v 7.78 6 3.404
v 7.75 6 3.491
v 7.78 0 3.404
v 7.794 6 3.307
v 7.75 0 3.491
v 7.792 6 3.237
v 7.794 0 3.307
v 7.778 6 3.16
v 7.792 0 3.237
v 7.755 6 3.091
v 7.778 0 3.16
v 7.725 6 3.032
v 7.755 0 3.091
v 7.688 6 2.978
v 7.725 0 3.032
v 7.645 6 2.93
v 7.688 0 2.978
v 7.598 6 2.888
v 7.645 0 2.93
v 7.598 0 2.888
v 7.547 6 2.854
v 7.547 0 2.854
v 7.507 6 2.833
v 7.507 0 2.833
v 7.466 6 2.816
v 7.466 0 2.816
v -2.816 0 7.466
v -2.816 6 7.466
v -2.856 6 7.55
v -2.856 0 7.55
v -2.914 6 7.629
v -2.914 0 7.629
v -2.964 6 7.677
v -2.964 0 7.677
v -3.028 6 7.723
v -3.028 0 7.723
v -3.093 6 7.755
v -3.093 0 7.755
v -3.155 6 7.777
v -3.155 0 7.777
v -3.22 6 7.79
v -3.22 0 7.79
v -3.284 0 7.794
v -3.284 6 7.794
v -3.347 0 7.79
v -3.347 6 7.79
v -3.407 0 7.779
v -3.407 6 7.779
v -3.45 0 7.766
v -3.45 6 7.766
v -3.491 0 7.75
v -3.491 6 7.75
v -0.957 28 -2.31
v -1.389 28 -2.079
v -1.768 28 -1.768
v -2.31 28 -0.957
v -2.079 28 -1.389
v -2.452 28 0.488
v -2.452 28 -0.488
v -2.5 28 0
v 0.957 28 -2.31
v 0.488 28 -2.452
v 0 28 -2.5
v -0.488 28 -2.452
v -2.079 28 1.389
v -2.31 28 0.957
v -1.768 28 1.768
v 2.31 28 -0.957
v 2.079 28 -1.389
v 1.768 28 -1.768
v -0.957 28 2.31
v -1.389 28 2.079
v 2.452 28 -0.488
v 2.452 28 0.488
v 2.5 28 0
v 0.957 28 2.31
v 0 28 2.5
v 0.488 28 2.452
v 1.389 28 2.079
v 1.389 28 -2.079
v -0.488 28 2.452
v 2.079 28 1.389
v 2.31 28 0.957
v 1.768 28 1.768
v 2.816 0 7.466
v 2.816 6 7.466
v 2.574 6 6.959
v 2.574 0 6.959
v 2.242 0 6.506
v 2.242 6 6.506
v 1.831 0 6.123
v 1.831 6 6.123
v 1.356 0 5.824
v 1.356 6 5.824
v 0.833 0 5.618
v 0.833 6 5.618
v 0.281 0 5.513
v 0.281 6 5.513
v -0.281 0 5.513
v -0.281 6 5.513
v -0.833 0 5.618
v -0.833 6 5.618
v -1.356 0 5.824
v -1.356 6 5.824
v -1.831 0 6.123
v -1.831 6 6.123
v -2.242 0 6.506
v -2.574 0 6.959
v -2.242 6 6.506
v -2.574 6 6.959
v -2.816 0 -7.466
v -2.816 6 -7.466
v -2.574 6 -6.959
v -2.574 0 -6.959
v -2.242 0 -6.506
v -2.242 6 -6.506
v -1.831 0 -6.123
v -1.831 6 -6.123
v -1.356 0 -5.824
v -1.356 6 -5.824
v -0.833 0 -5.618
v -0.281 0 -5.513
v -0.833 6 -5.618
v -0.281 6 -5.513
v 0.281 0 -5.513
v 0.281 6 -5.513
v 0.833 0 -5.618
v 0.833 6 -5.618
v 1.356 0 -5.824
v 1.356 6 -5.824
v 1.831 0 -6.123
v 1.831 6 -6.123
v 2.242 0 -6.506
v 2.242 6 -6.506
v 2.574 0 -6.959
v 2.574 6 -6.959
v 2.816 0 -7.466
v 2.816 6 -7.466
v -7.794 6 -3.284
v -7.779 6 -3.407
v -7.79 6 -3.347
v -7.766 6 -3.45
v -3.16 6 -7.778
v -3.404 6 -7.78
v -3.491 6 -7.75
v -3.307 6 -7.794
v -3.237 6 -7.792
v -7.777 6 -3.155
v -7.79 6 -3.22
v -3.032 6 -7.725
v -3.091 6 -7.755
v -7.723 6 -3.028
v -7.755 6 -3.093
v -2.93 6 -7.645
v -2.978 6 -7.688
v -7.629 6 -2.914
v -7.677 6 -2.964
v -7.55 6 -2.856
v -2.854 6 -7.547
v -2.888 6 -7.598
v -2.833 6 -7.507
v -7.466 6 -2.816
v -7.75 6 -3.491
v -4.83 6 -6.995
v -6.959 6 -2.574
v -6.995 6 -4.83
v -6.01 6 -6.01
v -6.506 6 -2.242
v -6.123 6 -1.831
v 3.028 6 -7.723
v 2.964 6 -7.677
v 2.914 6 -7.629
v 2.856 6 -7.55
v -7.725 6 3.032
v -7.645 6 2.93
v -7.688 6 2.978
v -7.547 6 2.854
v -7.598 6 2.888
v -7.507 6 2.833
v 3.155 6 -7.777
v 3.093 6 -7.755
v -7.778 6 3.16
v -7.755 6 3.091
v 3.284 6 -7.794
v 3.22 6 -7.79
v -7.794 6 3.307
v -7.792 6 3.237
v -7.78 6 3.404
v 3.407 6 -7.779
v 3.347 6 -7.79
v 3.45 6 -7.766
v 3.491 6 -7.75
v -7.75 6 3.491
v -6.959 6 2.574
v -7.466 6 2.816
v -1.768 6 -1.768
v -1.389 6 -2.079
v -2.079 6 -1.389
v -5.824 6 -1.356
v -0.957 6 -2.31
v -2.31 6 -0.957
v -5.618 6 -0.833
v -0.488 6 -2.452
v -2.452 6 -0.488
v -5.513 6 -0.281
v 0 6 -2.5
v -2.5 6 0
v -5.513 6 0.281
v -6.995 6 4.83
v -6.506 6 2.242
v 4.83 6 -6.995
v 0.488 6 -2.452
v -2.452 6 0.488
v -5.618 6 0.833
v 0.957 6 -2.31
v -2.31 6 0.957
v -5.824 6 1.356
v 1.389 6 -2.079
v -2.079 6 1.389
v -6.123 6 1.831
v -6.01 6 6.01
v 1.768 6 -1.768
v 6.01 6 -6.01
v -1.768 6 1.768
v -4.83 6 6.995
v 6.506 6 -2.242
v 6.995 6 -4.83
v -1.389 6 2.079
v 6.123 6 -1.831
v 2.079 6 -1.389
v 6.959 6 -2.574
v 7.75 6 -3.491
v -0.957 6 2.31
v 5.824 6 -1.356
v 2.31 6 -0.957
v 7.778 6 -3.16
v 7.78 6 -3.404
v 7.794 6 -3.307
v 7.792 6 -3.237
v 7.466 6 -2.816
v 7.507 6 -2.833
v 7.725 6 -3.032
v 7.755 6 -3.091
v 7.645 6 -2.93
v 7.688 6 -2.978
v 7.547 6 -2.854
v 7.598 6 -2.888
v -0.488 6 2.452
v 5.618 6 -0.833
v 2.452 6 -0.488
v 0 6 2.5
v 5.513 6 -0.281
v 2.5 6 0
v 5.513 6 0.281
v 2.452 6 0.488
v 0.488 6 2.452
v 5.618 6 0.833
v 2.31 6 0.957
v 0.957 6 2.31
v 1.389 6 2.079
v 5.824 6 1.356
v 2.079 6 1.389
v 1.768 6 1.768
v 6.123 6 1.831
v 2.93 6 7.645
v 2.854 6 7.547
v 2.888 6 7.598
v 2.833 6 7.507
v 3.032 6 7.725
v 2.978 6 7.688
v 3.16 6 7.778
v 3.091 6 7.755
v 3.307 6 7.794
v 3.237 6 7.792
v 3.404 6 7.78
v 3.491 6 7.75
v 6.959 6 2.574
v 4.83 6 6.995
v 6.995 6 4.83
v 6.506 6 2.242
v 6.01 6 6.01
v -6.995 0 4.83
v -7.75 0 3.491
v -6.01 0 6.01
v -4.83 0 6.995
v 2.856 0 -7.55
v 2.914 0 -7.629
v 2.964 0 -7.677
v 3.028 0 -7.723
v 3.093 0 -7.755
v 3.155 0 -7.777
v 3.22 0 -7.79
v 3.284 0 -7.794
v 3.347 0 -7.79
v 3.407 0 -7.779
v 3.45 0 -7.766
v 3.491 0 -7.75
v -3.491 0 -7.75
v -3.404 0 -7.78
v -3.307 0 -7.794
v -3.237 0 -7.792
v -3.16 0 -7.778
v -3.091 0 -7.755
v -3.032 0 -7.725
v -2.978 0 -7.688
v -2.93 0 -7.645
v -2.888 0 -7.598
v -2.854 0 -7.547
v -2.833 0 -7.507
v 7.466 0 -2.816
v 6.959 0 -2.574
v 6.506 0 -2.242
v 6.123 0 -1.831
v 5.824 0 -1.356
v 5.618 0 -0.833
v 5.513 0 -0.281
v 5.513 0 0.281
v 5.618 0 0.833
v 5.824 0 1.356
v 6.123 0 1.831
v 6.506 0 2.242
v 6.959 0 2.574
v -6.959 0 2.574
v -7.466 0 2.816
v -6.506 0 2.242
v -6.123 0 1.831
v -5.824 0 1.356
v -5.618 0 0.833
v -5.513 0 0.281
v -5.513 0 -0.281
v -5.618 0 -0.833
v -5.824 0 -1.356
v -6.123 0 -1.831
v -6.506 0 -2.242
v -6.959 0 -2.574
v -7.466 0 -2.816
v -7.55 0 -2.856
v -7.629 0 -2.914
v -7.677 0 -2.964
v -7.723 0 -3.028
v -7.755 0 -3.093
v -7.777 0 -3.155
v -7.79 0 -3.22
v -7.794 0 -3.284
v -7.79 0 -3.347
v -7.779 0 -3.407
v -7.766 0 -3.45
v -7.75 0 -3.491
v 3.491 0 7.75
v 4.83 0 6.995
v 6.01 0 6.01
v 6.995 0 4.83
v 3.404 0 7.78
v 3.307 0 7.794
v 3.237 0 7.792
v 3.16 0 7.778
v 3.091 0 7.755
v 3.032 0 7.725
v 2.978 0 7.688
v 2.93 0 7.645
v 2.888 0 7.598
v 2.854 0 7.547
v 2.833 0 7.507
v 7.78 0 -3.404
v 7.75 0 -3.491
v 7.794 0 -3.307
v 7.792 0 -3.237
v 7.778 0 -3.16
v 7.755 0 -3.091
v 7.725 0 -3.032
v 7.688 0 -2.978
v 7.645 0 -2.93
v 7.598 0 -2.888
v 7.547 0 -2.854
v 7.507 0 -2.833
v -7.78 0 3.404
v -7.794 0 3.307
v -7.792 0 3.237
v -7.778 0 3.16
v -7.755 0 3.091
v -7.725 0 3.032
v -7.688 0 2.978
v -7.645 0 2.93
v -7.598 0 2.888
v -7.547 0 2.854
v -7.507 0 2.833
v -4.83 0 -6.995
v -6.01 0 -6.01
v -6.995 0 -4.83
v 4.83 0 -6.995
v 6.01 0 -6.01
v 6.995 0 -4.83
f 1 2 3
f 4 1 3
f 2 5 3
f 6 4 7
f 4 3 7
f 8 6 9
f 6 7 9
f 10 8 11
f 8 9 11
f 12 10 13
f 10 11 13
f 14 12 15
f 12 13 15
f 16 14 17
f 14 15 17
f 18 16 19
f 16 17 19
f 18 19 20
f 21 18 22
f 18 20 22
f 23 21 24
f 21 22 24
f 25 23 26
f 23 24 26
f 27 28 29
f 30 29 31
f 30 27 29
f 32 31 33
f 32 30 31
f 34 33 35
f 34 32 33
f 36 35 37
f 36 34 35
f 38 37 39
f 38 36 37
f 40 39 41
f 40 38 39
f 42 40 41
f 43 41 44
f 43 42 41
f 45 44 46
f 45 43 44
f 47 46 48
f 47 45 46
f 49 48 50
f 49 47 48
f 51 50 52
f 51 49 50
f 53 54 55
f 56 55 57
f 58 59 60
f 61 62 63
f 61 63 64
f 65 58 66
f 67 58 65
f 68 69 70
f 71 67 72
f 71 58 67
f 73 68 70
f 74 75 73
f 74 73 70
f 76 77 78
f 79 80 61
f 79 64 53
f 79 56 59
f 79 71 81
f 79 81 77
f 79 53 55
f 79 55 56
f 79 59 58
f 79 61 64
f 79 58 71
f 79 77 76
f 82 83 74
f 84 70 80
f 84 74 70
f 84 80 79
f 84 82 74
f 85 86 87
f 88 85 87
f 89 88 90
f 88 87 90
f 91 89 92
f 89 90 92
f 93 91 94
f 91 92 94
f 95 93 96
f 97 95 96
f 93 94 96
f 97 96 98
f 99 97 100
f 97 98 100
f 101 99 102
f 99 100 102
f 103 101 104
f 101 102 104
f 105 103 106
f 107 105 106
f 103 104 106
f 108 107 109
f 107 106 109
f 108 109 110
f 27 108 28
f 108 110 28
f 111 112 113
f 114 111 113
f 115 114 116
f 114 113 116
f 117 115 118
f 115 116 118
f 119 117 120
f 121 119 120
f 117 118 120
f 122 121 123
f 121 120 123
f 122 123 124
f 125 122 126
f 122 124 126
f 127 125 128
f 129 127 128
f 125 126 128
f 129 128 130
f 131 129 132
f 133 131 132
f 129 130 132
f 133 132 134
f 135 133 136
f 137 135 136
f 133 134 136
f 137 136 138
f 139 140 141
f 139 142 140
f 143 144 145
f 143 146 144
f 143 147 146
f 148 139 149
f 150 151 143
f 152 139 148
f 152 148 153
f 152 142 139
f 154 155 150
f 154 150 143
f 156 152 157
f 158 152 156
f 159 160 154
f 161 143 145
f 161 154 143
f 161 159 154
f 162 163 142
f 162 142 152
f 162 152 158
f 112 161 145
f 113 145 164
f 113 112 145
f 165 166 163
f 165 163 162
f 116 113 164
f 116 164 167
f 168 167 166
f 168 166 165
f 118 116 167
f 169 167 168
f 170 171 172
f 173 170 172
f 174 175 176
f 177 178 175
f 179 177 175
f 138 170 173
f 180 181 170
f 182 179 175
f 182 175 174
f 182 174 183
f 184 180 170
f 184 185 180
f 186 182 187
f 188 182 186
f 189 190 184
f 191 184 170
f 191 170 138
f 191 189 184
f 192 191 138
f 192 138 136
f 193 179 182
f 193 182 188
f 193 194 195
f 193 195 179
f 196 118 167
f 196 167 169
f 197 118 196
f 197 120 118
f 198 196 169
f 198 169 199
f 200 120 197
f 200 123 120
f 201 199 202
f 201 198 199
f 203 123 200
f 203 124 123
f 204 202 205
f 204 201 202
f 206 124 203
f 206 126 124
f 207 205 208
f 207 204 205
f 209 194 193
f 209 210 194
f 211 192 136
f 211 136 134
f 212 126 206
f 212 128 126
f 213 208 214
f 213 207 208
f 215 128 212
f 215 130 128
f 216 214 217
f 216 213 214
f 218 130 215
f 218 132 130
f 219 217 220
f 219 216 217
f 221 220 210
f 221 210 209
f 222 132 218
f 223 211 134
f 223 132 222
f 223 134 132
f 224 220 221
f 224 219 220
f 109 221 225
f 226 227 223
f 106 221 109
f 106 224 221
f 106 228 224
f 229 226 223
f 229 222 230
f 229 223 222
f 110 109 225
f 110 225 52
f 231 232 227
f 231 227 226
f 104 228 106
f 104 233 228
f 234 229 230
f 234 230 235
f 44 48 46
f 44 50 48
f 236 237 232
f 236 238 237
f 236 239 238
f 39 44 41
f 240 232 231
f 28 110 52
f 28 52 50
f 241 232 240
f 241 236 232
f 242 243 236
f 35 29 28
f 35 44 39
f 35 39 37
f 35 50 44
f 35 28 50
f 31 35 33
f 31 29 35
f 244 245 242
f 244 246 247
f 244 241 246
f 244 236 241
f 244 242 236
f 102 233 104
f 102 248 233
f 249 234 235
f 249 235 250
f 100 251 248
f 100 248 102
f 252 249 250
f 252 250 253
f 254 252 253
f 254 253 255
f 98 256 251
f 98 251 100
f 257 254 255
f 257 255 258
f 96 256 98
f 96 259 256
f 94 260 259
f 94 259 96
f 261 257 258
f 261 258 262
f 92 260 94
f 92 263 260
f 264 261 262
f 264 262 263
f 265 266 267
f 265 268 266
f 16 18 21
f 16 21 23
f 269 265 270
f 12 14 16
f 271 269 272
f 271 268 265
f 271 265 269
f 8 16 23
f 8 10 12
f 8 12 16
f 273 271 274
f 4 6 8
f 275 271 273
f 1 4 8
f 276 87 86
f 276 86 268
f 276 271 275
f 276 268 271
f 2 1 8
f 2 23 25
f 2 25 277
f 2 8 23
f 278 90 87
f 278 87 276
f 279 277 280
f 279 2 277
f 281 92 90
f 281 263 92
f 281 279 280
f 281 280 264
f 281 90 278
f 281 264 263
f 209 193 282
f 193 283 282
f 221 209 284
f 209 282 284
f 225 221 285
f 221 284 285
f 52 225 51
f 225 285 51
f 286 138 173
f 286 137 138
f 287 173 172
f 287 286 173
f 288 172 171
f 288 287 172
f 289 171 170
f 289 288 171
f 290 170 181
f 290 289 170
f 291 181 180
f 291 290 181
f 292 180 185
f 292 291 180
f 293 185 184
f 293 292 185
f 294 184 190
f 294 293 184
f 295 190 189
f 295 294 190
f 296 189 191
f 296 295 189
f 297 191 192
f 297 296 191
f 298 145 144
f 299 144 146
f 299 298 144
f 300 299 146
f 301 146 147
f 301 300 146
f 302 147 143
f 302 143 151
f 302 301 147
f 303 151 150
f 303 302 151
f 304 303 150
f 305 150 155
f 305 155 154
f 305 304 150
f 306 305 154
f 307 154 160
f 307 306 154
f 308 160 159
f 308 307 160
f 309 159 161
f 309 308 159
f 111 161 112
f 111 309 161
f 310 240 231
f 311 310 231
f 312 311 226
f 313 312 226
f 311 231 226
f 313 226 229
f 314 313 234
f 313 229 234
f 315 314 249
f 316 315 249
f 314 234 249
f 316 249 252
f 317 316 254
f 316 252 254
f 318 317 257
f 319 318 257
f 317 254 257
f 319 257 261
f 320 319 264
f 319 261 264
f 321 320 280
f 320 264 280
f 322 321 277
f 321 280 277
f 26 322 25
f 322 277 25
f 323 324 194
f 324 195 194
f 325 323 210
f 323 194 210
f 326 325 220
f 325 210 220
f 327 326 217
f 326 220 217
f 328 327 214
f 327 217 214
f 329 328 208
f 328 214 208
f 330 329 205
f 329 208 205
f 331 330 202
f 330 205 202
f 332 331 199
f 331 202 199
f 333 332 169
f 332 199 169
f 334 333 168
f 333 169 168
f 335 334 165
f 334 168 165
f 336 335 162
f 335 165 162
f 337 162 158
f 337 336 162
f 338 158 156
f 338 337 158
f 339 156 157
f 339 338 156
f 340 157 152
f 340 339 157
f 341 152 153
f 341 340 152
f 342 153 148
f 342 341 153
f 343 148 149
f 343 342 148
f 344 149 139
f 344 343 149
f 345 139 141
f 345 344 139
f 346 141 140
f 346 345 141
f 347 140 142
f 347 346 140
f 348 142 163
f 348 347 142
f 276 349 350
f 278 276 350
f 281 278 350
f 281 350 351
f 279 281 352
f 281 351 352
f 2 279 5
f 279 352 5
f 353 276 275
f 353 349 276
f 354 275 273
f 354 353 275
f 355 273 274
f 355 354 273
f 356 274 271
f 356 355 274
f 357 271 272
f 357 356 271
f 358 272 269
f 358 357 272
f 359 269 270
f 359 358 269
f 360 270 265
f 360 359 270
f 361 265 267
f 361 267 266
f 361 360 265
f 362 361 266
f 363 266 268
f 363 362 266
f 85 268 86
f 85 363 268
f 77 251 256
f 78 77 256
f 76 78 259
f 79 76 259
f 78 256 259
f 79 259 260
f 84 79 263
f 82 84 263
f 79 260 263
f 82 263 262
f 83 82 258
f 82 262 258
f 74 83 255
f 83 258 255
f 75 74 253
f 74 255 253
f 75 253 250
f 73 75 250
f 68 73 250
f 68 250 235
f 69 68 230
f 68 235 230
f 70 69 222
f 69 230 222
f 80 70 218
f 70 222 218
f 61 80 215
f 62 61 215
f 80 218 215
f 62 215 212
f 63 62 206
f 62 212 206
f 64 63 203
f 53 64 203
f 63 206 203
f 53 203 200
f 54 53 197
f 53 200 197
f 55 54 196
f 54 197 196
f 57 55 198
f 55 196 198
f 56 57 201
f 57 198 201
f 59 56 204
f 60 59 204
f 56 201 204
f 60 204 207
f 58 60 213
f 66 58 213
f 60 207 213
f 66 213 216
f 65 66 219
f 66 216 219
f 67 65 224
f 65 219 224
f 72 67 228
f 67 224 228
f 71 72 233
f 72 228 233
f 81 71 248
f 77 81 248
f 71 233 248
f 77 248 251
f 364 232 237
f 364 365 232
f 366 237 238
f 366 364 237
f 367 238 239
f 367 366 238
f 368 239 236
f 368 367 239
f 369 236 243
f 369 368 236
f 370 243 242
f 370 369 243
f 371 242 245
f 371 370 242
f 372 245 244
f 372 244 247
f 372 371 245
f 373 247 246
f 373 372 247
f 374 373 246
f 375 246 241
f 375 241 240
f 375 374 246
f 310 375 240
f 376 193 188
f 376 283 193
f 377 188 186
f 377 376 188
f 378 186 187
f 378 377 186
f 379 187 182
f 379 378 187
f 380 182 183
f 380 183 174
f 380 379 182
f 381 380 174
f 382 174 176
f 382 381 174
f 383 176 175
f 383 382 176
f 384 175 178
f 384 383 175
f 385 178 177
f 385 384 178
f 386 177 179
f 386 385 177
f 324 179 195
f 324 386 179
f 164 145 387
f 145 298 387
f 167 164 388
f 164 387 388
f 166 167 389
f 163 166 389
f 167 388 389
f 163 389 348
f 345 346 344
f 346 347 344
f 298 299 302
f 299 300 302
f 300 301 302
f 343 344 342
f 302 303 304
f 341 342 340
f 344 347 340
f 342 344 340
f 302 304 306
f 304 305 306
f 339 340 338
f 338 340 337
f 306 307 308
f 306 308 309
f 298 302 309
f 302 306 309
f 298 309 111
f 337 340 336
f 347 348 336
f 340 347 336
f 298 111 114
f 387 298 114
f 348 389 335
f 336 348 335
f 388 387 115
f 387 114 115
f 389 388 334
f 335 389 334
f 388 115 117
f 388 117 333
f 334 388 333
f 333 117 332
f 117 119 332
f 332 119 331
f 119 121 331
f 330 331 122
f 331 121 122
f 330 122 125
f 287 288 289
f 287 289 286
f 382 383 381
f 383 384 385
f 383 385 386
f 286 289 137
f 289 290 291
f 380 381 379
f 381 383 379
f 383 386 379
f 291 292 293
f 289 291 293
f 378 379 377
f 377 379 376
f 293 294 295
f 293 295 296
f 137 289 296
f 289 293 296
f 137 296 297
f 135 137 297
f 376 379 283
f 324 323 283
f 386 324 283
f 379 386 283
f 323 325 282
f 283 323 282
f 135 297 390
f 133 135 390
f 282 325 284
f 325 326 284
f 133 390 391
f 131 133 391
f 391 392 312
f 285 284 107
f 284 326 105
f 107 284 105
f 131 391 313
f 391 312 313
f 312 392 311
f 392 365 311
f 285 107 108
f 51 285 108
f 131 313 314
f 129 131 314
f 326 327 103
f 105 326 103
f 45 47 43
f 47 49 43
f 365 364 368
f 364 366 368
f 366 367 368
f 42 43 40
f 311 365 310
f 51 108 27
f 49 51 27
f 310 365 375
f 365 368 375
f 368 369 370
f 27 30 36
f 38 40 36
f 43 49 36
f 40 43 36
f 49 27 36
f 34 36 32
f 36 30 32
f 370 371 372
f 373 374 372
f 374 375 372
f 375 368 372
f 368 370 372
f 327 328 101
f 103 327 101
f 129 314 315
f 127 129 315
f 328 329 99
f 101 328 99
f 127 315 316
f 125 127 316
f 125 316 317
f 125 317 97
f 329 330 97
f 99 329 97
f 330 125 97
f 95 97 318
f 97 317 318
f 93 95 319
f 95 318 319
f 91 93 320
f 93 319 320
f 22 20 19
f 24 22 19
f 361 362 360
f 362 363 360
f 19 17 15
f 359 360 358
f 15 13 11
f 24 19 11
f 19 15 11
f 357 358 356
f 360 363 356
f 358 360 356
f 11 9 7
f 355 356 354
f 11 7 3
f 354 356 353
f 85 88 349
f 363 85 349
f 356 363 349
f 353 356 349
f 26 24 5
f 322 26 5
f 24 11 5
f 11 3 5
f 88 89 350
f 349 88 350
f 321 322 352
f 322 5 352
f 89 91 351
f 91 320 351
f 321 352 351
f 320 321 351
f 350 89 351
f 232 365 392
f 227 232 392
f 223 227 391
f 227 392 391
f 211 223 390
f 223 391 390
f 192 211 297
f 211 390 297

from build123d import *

# Parameters (mm, degrees)
SKETCH1_R           = 8.5
BOSS_EXTRUDE1_DEPTH = 6
SKETCH2_R           = 2.5
BOSS_EXTRUDE2_DEPTH = 22
SKETCH3_R           = 3
CUT_EXTRUDE1_DEPTH  = 13
FILLET1_R           = 0.5


with BuildPart() as part:
    # Sketch1 → Boss-Extrude1 (new body)
    with BuildSketch(Plane(origin=(0, 0, 0), x_dir=(1, 0, 0), z_dir=(0, 1, 0))):
        with Locations(Location((0, 0, 0), (0, 0, 270))):
            Circle(SKETCH1_R)
    extrude(amount=BOSS_EXTRUDE1_DEPTH)

    # Sketch2 → Boss-Extrude2 (add)
    with BuildSketch(Plane(origin=(0, 6, 0), x_dir=(1, 0, 0), z_dir=(0, 1, 0))):
        with Locations(Location((0, 0, 0), (0, 0, 270))):
            Circle(SKETCH2_R)
    extrude(amount=BOSS_EXTRUDE2_DEPTH)

    # Sketch3 → Cut-Extrude1 (cut)
    with BuildSketch(Plane(origin=(0, 6, 0), x_dir=(1, 0, 0), z_dir=(0, 1, 0))):
        with Locations((-8.5, 0)):
            Circle(SKETCH3_R)
        with Locations((0, 8.5)):
            Circle(SKETCH3_R)
        with Locations((8.5, 0)):
            Circle(SKETCH3_R)
        with Locations((0, -8.5)):
            Circle(SKETCH3_R)
    extrude(amount=-CUT_EXTRUDE1_DEPTH, mode=Mode.SUBTRACT)

    # Fillet1
    fillet1_edges = [part.edges().sort_by_distance(p)[0] for p in [
        (-7.970588235, 3, -2.952917741),
        (-7.970588235, 3, 2.952917741),
        (2.952917741, 3, -7.970588235),
        (-2.952917741, 3, -7.970588235),
        (7.970588235, 3, 2.952917741),
        (7.970588235, 3, -2.952917741),
        (-2.952917741, 3, 7.970588235),
        (2.952917741, 3, 7.970588235),
    ]]
    fillet(fillet1_edges, radius=FILLET1_R)


solid = part.part
